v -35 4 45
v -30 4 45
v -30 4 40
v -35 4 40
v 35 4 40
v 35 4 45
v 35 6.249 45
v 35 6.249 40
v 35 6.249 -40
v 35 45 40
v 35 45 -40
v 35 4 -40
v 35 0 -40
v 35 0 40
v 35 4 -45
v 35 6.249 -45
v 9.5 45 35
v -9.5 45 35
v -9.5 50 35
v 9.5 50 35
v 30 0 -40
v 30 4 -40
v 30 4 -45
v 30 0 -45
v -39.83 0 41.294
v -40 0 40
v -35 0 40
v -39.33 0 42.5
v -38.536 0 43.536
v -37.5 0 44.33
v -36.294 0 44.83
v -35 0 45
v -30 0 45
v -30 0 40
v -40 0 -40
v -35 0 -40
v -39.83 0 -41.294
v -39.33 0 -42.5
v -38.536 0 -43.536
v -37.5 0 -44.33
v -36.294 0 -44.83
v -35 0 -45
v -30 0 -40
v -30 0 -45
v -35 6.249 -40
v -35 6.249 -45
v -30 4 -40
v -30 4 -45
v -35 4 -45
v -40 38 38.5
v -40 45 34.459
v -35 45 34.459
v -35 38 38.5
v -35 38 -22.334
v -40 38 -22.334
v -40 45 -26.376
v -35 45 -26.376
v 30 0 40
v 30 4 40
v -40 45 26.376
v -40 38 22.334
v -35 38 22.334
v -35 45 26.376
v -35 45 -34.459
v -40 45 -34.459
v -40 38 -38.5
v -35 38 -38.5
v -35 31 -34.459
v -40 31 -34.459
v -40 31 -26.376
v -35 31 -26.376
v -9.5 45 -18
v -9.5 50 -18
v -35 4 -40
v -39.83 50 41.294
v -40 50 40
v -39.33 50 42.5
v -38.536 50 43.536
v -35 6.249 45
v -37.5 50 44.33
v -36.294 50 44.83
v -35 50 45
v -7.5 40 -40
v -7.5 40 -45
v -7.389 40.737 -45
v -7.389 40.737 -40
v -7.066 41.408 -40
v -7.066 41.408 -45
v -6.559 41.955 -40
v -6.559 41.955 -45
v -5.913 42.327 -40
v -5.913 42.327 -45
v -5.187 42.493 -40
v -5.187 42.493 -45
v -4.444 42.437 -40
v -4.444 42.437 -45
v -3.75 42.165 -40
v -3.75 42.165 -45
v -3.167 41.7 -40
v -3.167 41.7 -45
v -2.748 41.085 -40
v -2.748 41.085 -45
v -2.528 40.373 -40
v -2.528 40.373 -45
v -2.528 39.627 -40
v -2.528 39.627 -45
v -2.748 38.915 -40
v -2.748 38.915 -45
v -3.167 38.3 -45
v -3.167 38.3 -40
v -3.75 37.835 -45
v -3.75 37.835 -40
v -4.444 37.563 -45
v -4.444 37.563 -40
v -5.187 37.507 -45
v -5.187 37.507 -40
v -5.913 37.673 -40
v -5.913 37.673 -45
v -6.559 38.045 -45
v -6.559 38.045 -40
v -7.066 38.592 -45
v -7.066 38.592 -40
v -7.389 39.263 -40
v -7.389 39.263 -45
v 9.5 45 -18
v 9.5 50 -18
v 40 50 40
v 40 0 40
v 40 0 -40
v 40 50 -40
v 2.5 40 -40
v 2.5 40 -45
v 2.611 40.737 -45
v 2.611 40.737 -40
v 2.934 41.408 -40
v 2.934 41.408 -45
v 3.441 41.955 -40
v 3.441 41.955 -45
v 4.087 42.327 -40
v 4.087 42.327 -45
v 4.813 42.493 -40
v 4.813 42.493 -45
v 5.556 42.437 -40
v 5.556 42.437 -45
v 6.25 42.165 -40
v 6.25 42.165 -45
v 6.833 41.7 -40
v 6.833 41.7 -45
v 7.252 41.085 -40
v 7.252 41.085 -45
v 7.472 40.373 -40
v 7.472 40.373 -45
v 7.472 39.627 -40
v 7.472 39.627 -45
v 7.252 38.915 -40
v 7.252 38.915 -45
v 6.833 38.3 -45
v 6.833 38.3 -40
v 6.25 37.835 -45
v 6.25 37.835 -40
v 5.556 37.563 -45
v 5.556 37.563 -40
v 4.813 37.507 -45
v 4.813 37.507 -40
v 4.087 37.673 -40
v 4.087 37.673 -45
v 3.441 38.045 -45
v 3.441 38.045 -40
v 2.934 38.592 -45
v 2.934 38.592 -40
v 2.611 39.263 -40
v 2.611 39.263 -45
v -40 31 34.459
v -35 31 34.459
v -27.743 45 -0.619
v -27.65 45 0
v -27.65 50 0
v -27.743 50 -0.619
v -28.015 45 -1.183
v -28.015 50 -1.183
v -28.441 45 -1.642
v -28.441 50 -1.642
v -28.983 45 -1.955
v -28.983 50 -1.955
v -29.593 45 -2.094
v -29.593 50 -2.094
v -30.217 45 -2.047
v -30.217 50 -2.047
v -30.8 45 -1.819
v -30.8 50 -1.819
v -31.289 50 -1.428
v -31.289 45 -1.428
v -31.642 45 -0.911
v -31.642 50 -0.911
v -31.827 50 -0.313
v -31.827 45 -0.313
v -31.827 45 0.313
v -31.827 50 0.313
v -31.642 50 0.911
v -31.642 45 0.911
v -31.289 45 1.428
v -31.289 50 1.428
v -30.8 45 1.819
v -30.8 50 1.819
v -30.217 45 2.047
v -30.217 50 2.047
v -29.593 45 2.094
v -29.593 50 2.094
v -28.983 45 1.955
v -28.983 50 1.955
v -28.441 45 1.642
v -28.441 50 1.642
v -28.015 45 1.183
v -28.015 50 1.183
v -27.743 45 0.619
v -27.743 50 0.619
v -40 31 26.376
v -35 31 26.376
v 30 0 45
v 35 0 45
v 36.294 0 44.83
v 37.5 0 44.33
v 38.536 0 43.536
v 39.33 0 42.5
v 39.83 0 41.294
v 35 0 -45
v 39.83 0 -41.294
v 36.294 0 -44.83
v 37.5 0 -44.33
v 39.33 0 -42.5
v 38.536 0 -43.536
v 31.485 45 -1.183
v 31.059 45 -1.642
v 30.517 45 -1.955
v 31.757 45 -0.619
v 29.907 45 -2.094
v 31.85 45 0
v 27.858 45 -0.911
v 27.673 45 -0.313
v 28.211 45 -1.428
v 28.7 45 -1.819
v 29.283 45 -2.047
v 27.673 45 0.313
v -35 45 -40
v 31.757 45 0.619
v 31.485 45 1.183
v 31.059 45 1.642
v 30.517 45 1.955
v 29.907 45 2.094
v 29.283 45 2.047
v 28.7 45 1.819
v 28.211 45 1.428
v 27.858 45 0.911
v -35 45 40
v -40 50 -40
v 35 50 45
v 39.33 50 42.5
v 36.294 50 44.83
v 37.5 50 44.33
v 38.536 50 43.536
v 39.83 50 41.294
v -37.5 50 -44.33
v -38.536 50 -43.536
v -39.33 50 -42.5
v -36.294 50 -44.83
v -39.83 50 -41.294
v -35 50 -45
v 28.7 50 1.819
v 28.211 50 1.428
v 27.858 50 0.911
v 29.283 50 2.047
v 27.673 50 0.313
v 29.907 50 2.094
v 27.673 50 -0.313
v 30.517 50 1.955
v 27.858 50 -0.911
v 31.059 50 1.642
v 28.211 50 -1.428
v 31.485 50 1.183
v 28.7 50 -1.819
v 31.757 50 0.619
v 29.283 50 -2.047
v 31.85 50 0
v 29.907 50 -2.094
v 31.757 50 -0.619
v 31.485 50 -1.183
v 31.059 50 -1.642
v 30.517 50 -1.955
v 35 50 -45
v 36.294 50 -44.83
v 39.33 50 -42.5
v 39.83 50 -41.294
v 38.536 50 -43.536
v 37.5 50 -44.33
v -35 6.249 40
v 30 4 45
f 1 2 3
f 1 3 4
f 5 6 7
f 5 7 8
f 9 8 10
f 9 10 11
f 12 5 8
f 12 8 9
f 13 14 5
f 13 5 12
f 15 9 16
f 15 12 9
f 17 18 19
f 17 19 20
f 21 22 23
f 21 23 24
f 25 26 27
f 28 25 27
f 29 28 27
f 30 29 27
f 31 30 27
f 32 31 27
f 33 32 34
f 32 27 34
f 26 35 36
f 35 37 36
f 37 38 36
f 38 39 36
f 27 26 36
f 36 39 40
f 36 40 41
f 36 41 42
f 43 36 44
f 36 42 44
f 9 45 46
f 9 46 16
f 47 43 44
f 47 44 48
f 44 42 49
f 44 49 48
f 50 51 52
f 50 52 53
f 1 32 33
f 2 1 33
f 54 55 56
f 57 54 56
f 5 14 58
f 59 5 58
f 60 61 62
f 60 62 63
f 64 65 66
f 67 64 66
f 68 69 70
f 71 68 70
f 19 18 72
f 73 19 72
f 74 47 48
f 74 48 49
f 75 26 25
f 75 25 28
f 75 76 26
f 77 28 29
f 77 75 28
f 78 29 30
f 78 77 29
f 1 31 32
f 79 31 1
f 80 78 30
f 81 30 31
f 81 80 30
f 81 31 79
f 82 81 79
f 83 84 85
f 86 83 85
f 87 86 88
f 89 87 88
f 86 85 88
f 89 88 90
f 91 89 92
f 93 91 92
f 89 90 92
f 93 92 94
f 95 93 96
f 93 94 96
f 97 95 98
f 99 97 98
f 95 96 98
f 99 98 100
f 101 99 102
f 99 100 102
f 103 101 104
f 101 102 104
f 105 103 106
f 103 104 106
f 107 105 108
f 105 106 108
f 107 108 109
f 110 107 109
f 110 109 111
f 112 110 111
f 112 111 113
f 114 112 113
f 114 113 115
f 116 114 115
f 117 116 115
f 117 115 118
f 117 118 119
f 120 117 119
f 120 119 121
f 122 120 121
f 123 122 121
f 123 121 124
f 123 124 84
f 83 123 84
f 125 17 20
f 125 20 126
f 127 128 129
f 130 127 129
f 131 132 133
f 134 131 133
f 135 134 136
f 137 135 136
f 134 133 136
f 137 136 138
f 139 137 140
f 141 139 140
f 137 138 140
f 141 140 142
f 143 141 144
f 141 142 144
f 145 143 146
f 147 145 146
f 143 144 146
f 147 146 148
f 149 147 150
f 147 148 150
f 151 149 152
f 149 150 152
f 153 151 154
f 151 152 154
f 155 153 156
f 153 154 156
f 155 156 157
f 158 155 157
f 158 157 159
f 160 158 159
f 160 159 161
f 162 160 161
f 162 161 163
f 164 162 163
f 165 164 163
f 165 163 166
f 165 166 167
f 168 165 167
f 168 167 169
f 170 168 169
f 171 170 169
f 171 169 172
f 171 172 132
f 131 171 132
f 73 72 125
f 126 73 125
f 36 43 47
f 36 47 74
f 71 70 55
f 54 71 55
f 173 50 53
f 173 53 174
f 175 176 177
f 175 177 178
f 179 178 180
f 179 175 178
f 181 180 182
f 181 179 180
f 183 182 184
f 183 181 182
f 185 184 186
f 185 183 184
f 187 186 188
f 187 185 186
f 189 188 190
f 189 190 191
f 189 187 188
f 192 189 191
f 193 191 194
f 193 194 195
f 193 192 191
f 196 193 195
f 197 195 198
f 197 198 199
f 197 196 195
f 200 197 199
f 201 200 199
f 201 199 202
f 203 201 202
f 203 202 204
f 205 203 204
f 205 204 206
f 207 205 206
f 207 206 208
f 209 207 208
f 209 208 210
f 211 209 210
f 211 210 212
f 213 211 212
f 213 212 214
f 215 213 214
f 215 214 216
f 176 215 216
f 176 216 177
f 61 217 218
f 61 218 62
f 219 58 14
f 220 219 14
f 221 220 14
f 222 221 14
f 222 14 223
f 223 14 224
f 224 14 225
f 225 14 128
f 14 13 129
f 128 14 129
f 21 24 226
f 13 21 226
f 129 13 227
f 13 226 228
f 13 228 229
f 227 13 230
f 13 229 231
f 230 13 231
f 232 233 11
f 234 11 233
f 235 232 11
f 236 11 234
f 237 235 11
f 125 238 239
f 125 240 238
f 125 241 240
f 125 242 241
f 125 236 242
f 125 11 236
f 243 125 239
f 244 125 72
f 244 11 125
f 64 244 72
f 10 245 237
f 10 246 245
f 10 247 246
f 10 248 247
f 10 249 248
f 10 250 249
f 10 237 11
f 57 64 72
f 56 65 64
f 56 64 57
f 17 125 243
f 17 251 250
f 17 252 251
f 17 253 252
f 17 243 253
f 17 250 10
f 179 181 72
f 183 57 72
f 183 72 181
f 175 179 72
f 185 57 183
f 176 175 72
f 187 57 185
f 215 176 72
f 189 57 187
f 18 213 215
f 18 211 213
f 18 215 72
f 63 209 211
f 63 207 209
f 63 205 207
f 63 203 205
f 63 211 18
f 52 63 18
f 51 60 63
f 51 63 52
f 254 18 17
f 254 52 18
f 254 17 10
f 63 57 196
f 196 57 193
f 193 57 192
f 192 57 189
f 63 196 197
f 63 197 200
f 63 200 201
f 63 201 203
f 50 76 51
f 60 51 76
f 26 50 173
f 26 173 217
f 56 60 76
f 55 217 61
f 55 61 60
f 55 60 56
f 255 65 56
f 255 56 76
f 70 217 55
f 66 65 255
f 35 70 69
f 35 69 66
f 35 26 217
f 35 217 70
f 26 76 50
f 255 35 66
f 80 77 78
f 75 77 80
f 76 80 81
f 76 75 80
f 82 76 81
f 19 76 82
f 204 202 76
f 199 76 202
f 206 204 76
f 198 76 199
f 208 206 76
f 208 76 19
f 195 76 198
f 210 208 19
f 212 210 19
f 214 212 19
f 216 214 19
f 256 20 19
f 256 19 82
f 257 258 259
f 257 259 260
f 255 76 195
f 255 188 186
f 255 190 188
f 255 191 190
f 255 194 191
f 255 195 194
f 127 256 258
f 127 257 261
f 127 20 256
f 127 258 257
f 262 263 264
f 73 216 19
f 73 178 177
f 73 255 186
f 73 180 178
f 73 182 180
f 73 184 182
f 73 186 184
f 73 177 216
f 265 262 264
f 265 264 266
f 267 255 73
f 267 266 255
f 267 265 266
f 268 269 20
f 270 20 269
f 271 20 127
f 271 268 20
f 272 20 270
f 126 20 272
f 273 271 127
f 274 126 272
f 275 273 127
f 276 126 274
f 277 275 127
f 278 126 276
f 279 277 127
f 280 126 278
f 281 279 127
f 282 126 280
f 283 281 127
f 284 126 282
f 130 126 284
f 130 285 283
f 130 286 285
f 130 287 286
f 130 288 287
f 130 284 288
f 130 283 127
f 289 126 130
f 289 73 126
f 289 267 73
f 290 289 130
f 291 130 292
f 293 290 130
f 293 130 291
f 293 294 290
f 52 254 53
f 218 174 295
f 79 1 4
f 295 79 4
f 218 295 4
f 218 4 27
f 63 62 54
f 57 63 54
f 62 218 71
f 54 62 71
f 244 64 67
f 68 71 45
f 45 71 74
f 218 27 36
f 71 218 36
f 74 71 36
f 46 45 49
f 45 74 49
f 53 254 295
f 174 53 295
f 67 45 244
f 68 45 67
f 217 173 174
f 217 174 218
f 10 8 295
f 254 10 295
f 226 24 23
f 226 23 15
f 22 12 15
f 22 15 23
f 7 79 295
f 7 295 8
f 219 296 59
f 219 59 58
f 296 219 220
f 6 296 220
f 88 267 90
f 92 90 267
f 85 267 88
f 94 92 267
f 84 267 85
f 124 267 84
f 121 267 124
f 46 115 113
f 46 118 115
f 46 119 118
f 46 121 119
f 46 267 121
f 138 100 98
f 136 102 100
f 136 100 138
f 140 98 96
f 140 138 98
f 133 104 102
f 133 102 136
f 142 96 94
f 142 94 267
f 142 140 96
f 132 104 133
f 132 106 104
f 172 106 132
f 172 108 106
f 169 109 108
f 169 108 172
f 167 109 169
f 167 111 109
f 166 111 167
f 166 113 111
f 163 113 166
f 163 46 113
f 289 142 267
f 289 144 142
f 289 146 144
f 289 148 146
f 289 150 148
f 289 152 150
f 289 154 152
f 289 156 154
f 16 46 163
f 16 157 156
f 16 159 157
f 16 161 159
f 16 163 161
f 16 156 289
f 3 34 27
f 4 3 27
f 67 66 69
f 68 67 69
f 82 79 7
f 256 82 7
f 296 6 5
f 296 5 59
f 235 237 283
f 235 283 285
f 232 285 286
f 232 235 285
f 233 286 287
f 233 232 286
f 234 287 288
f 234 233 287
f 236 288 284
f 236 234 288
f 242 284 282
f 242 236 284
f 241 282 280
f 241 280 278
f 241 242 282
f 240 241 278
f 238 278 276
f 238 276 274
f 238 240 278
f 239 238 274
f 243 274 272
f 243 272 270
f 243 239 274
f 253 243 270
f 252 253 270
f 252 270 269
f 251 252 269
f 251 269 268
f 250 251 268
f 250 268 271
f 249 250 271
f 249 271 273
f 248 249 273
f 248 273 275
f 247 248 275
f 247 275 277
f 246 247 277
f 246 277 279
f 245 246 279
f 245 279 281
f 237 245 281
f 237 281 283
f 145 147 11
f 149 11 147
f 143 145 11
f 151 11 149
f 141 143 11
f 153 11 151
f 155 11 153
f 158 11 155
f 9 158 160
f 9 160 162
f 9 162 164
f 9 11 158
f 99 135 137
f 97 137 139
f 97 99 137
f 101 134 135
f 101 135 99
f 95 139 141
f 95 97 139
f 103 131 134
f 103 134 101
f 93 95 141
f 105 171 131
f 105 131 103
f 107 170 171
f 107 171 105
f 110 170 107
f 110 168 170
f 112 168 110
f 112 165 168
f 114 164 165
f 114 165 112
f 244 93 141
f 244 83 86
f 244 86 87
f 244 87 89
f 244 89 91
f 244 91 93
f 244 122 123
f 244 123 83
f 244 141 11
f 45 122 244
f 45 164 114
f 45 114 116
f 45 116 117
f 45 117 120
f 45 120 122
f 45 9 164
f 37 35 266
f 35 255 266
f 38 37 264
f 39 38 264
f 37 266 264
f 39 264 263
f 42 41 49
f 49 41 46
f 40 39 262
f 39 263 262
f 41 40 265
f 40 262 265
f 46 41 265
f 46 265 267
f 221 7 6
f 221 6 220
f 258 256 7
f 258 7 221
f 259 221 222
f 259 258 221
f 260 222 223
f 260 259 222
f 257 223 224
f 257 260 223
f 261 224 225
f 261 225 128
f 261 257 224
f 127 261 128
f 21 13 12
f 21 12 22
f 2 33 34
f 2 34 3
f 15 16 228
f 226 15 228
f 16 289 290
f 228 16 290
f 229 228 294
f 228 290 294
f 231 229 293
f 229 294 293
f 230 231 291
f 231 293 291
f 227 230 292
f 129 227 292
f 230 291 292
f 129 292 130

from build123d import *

# Parameters (mm, degrees)
SKETCH1_W           = 80
SKETCH1_H           = 90
SKETCH1_R           = 2.1
SKETCH1_W_2         = 19
SKETCH1_H_2         = 53
BOSS_EXTRUDE3_DEPTH = 50
SKETCH5_W           = 70
SKETCH5_H           = 80
CUT_EXTRUDE2_DEPTH  = 45
SKETCH6_R           = 2.5
CUT_EXTRUDE5_DEPTH  = 10.25
CUT_EXTRUDE6_DEPTH  = 10.25
FILLET2_R           = 5
CUT_EXTRUDE9_DEPTH  = 1000


with BuildPart() as part:
    # Sketch1 → Boss-Extrude3 (new body)
    with BuildSketch(Plane(origin=(0, 0, 0), x_dir=(1, 0, 0), z_dir=(0, 1, 0))):
        Rectangle(SKETCH1_W, SKETCH1_H)
        with Locations((29.75, 0)):
            Circle(SKETCH1_R, mode=Mode.SUBTRACT)
        with Locations((-29.75, 0)):
            Circle(SKETCH1_R, mode=Mode.SUBTRACT)
        with Locations((0, -8.5)):
            Rectangle(SKETCH1_W_2, SKETCH1_H_2, mode=Mode.SUBTRACT)
    extrude(amount=BOSS_EXTRUDE3_DEPTH)

    # Sketch5 → Cut-Extrude2 (cut)
    with BuildSketch(Plane(origin=(0, 0, 0), x_dir=(-1, 0, 0), z_dir=(0, -1, 0))):
        Rectangle(SKETCH5_W, SKETCH5_H)
    extrude(amount=-CUT_EXTRUDE2_DEPTH, mode=Mode.SUBTRACT)

    # Sketch6 → Cut-Extrude5 (cut)
    with BuildSketch(Plane(origin=(0, 0, -45), x_dir=(-1, 0, 0), z_dir=(0, 0, -1))):
        with Locations((-5, 40)):
            Circle(SKETCH6_R)
        with Locations((5, 40)):
            Circle(SKETCH6_R)
    extrude(amount=-CUT_EXTRUDE5_DEPTH, mode=Mode.SUBTRACT)

    # Sketch7 → Cut-Extrude6 (cut)
    with BuildSketch(Plane.ZY.offset(40)):
        Polygon((-26.375644347, 31), (-22.334192463, 38), (-26.375644347, 45), (-34.458548116, 45), (-38.5, 38), (-34.458548116, 31), align=None)
        Polygon((34.458548116, 31), (26.375644347, 31), (22.334192463, 38), (26.375644347, 45), (34.458548116, 45), (38.5, 38), align=None)
    extrude(amount=-CUT_EXTRUDE6_DEPTH, mode=Mode.SUBTRACT)

    # Fillet2
    fillet2_edges = [part.edges().sort_by_distance(p)[0] for p in [
        (40, 25, 45),
        (-40, 25, 45),
        (-40, 25, -45),
        (40, 25, -45),
    ]]
    fillet(fillet2_edges, radius=FILLET2_R)

    # Sketch8 → Cut-Extrude9 (cut)
    with BuildSketch(Plane.XY.offset(45)):
        Polygon((-35, 6.24869217), (35, 6.24869217), (35, 4), (30, 4), (30, 0), (-30, 0), (-30, 4), (-35, 4), align=None)
    extrude(amount=-CUT_EXTRUDE9_DEPTH, mode=Mode.SUBTRACT)


solid = part.part
